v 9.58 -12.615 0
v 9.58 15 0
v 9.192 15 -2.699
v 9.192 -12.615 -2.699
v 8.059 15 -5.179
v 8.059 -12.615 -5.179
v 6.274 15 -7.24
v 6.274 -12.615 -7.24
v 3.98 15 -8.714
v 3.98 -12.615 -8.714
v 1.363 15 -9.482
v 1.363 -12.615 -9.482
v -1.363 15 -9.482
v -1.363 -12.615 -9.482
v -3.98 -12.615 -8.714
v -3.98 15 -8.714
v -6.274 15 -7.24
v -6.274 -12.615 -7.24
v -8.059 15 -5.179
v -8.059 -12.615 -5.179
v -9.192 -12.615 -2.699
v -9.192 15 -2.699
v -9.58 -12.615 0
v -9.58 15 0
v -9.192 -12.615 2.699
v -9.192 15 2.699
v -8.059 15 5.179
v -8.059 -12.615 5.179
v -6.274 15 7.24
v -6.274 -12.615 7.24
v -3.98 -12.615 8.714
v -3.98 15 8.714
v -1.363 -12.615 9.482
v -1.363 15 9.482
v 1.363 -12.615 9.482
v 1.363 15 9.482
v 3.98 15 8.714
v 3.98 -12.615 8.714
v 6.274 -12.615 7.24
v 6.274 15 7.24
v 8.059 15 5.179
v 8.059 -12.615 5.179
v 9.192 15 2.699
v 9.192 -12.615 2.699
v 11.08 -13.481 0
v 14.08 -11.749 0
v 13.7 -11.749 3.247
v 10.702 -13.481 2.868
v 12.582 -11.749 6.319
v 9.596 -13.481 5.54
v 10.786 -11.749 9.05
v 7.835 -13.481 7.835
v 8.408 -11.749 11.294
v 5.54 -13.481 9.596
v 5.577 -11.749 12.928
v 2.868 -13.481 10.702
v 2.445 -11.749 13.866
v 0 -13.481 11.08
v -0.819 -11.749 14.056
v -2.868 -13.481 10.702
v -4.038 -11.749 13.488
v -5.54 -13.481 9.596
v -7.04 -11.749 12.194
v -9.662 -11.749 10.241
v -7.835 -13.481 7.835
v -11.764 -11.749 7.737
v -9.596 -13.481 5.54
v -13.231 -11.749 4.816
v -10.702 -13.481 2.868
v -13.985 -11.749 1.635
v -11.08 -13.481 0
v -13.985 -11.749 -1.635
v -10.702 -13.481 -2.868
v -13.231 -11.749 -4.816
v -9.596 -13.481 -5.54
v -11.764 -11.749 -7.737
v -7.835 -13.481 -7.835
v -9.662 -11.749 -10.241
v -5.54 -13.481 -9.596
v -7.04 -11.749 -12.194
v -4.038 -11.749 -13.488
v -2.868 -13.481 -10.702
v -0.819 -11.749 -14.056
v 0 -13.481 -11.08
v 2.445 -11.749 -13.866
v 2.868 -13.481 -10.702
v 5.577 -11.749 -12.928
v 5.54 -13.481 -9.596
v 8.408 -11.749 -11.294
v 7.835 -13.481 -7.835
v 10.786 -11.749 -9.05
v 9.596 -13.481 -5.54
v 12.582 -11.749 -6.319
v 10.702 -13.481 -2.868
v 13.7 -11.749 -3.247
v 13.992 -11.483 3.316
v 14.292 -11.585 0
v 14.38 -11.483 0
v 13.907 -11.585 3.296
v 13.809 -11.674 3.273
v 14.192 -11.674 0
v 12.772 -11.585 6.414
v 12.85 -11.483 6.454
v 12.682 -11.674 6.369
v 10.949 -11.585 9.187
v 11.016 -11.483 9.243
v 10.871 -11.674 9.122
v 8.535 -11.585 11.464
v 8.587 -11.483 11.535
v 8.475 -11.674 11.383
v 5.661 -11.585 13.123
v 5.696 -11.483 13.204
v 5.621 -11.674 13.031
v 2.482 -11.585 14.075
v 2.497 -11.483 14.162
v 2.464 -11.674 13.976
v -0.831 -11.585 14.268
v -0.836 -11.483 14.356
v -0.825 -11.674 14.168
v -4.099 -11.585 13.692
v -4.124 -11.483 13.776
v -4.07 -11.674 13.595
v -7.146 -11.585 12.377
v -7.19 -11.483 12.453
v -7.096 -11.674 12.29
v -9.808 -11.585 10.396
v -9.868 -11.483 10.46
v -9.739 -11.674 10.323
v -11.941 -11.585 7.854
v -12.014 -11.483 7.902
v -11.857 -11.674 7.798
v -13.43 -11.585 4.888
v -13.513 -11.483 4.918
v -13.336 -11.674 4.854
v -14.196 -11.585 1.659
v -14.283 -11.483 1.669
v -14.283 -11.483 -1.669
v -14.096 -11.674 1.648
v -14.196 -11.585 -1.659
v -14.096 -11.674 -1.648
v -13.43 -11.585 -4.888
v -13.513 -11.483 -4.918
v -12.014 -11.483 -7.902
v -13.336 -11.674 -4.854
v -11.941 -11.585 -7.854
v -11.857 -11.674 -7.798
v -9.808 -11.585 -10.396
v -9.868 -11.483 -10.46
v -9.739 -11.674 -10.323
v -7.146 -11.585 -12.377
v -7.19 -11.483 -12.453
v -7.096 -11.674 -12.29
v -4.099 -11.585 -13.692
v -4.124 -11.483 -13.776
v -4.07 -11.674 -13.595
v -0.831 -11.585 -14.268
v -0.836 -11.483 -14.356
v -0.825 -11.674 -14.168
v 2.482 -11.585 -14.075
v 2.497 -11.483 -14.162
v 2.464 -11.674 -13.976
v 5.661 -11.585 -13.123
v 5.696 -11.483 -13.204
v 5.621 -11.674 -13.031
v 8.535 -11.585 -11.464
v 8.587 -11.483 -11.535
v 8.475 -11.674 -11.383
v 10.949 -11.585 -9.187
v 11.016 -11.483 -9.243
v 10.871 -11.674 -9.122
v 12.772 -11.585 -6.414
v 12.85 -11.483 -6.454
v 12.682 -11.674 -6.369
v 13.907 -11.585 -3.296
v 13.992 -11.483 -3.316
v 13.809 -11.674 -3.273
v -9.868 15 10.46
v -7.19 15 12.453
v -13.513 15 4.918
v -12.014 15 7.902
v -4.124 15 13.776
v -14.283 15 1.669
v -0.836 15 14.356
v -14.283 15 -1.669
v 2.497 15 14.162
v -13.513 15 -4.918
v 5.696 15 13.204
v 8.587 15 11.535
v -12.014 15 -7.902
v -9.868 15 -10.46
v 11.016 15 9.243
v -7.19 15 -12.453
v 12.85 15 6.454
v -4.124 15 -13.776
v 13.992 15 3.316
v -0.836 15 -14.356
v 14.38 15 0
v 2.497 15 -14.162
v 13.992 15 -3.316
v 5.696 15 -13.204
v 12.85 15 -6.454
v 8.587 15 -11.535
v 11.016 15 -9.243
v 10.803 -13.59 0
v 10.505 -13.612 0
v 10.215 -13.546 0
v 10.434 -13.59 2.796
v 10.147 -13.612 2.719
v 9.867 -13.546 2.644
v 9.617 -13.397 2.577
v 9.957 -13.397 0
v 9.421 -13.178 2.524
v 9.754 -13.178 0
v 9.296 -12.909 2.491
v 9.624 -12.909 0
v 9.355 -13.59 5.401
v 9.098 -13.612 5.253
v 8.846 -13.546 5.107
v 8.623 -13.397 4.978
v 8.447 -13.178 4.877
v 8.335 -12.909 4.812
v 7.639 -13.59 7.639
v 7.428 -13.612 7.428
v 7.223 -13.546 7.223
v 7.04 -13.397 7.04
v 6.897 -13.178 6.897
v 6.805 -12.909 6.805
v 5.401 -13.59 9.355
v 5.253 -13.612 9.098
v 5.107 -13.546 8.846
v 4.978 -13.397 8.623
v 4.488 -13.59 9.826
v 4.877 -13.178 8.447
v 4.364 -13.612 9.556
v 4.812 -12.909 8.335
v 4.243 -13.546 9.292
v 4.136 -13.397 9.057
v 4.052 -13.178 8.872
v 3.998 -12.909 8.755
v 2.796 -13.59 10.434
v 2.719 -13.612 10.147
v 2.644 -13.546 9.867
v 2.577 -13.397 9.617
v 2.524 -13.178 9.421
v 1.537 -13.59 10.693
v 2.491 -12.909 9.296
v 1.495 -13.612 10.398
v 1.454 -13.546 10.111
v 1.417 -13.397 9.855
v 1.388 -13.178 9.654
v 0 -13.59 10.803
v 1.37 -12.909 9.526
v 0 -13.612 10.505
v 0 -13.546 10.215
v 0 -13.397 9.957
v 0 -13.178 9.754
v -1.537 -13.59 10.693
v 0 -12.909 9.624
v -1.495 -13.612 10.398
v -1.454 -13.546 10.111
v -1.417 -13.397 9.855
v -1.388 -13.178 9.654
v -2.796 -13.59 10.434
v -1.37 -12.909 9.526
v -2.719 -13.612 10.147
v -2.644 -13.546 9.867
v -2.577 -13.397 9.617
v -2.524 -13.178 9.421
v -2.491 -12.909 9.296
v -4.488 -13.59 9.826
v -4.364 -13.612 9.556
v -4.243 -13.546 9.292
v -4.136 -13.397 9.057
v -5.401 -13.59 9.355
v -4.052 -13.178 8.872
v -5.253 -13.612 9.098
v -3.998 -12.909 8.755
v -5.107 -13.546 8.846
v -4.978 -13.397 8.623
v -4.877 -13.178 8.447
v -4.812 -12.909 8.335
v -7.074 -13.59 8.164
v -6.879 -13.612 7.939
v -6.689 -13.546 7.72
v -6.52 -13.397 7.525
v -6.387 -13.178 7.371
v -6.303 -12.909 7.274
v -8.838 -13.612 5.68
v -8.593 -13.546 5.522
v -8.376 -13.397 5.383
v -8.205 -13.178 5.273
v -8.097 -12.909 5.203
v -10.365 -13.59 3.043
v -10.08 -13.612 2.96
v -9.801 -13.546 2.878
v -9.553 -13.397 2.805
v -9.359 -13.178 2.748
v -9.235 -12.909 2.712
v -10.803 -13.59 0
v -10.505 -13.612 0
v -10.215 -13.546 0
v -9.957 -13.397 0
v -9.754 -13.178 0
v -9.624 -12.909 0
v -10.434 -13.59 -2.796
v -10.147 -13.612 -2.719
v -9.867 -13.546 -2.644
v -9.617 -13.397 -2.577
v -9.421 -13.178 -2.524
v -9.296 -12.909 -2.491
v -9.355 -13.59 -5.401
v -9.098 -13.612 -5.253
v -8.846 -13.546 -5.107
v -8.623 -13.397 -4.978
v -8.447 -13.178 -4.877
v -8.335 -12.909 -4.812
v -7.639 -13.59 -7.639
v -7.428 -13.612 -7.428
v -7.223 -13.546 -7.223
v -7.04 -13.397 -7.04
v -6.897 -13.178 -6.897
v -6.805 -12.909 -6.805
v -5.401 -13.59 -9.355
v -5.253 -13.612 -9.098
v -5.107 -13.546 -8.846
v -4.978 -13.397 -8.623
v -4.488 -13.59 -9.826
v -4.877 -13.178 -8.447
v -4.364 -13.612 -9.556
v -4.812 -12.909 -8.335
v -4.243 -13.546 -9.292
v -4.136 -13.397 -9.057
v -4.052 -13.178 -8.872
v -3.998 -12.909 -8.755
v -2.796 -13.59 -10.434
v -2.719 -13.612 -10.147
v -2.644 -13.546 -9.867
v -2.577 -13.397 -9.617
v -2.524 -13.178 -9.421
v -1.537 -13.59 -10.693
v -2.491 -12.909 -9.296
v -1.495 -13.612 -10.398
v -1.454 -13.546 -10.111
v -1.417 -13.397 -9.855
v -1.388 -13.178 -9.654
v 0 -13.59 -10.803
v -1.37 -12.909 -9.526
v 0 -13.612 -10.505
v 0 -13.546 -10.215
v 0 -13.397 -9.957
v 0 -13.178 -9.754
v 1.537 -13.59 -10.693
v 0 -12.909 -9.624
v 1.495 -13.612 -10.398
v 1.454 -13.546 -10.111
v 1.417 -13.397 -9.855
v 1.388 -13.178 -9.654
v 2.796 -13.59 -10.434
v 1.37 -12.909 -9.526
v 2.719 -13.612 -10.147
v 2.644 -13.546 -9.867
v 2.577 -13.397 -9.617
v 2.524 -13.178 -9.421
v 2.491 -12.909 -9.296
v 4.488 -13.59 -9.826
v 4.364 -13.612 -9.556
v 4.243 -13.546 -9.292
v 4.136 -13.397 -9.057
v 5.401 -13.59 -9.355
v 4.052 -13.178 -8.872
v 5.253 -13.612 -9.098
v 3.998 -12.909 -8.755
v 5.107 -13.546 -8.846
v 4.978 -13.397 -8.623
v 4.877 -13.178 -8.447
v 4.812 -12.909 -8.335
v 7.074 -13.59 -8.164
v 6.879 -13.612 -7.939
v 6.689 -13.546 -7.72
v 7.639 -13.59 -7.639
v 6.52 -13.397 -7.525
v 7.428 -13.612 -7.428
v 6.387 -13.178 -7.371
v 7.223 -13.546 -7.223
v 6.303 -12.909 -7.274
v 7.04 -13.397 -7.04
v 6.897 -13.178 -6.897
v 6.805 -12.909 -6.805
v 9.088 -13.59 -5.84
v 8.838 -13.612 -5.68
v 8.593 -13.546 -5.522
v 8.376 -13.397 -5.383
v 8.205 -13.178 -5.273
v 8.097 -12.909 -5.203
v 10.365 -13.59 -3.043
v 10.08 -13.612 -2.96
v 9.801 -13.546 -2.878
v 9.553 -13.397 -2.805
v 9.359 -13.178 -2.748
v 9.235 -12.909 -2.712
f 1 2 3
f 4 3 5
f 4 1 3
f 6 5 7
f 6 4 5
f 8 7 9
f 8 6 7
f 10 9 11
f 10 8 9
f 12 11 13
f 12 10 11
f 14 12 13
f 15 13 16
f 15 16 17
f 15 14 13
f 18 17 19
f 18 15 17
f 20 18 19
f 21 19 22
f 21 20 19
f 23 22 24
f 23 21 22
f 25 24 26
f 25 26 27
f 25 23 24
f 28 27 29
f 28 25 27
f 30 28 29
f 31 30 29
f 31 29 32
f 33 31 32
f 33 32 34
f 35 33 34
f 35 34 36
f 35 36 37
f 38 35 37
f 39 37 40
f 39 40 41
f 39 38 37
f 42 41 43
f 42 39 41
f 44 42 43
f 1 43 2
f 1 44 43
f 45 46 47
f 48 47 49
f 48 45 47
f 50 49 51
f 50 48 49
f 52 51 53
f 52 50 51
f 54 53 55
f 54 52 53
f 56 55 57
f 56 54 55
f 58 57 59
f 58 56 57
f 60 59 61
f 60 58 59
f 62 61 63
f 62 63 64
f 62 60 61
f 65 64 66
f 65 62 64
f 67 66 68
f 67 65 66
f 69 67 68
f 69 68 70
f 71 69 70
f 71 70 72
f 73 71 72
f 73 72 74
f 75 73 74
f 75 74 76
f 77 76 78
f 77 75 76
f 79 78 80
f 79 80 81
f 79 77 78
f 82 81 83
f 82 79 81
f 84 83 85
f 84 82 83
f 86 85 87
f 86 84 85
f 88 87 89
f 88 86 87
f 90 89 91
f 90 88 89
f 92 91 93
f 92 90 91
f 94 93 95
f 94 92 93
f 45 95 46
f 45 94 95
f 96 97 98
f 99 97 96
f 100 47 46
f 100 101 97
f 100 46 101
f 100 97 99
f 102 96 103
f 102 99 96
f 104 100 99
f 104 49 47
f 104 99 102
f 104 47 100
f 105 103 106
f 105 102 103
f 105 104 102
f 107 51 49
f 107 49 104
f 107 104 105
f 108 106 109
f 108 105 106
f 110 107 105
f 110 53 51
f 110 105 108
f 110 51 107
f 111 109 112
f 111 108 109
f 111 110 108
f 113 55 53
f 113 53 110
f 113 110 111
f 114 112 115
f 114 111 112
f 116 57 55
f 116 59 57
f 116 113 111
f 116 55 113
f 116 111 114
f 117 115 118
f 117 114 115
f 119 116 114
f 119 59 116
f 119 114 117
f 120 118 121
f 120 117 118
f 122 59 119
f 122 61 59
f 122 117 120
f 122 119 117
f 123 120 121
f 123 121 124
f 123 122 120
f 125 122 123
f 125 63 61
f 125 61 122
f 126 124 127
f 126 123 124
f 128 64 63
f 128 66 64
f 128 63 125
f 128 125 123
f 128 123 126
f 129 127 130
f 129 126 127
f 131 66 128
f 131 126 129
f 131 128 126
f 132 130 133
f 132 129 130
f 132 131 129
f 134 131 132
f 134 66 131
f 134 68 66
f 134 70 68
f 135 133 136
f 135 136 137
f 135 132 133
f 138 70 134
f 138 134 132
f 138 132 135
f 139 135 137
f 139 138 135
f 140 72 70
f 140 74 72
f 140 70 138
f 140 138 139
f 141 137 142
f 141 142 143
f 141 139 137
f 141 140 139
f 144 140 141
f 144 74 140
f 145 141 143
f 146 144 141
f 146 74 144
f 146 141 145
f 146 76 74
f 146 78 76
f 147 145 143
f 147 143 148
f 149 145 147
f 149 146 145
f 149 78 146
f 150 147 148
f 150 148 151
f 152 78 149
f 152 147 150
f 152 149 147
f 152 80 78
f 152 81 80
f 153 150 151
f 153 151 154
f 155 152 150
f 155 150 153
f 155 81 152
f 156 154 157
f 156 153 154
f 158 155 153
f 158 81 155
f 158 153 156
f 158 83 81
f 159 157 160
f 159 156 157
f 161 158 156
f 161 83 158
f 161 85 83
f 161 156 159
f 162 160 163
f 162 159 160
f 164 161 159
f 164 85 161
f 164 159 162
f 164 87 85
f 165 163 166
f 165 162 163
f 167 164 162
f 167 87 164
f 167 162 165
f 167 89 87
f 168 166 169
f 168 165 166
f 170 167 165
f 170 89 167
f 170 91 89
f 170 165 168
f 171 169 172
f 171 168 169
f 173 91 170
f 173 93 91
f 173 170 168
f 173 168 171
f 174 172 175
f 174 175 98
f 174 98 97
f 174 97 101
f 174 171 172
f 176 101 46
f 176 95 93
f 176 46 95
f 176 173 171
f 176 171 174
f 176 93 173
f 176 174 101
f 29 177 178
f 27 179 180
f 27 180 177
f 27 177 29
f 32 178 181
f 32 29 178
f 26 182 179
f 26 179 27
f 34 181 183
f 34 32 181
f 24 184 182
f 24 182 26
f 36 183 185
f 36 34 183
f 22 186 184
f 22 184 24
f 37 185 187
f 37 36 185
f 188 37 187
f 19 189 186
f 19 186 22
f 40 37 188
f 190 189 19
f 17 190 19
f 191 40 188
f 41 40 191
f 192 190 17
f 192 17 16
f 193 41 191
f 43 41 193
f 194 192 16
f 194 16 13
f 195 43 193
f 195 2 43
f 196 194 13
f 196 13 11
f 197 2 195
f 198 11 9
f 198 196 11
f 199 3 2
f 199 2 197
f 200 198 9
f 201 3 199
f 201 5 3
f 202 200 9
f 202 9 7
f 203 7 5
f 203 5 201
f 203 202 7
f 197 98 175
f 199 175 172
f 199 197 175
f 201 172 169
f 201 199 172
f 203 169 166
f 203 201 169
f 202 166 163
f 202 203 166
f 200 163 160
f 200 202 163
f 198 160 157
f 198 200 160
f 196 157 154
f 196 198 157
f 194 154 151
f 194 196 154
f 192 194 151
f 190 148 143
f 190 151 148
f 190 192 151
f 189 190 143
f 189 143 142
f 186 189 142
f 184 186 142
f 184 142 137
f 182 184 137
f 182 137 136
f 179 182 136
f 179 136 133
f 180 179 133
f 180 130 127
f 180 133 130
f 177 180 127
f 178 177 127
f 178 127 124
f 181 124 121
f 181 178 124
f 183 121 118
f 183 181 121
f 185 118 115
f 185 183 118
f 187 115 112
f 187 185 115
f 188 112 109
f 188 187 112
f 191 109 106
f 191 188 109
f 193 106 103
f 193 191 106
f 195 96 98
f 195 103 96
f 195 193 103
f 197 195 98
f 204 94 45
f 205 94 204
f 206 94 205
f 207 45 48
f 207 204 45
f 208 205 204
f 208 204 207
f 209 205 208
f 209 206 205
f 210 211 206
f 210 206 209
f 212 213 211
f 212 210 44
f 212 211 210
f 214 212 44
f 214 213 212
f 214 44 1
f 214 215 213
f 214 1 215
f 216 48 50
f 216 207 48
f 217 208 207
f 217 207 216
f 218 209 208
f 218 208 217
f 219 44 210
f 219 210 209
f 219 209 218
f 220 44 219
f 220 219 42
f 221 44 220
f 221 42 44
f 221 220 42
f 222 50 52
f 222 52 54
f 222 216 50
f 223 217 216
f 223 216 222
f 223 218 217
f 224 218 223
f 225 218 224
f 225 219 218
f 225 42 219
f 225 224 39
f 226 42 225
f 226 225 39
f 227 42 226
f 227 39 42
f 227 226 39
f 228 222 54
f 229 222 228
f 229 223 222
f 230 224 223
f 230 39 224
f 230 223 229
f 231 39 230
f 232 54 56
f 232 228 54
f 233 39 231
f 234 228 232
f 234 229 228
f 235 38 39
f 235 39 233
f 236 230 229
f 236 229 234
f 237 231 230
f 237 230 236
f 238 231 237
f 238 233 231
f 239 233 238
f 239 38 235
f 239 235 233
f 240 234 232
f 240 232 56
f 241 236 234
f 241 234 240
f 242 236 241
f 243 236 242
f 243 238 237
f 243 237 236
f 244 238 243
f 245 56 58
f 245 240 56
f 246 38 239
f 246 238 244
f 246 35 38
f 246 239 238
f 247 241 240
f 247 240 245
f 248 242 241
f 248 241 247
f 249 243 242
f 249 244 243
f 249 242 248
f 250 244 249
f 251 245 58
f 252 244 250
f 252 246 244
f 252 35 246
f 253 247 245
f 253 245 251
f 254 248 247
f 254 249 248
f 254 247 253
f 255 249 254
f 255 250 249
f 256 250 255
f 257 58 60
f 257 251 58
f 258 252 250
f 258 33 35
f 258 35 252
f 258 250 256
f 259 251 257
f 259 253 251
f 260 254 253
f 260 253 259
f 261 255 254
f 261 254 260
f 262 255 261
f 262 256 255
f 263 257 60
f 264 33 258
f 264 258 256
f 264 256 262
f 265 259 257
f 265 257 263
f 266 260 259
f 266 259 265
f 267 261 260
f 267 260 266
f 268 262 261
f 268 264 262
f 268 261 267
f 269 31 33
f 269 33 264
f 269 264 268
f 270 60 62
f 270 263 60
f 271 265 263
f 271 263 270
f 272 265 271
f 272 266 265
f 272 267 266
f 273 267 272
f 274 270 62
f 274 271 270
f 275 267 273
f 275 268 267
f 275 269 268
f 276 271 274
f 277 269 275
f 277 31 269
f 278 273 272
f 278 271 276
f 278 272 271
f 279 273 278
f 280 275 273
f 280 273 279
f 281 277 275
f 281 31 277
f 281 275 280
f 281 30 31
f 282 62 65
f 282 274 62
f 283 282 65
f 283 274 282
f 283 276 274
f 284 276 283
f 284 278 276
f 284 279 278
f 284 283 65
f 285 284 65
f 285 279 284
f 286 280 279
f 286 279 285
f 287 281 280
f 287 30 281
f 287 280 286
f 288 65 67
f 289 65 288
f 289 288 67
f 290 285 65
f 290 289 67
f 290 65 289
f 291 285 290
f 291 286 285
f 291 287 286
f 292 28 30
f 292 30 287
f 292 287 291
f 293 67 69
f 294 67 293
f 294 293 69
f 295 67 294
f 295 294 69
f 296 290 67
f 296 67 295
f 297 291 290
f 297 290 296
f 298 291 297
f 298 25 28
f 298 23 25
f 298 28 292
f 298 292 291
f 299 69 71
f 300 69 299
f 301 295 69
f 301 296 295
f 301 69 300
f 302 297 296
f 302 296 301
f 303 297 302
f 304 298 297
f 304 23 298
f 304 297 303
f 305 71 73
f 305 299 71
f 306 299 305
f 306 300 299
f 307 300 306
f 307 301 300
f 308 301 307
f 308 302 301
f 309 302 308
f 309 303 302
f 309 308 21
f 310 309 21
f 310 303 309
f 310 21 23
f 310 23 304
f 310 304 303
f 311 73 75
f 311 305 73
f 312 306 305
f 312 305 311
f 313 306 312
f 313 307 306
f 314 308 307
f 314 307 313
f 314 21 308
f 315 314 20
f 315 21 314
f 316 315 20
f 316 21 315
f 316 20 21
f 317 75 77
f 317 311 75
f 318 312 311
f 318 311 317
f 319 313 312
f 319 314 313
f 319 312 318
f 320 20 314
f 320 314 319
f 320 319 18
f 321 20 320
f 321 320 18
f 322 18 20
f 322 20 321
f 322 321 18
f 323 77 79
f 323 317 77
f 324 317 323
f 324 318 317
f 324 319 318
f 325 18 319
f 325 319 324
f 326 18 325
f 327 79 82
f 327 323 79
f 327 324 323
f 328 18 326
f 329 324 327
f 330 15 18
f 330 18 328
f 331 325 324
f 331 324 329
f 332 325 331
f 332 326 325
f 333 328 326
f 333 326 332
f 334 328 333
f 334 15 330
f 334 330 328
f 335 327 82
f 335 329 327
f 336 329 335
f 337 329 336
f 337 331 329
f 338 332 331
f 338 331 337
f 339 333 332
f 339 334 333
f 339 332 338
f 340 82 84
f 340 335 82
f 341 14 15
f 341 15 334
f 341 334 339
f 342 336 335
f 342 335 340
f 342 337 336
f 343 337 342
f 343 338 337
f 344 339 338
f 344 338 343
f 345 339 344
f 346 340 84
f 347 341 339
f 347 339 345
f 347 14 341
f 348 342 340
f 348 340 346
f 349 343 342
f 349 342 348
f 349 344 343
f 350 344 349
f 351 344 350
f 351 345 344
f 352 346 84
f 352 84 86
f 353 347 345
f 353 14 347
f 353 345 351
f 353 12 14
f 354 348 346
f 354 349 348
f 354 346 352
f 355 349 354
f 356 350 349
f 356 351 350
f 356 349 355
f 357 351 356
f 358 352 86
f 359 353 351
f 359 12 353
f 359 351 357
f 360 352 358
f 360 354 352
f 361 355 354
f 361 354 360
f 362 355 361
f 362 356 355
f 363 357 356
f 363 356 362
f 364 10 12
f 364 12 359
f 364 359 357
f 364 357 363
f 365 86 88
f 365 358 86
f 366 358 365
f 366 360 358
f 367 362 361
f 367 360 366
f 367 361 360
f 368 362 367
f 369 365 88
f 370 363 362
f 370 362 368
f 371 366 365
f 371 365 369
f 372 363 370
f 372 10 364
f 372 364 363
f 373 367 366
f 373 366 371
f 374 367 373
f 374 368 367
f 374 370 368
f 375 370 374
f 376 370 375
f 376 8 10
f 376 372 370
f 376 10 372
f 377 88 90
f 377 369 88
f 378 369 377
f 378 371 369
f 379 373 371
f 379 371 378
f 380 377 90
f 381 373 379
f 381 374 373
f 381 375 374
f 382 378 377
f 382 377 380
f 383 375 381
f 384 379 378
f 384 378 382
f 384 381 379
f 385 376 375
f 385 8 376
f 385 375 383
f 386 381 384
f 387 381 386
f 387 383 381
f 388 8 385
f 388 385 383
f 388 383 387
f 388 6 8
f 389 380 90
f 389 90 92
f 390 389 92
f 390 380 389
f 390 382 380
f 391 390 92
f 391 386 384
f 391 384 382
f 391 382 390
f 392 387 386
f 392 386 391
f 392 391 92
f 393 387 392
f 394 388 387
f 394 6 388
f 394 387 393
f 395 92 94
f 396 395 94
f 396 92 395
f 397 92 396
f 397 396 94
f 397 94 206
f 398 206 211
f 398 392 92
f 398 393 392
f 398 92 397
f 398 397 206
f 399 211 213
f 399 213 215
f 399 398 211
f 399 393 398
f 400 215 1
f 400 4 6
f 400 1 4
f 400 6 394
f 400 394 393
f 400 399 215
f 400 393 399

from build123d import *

# Parameters (mm, degrees)
SKETCH4_R           = 14.58
SKETCH4_R_2         = 9.58
BOSS_EXTRUDE1_DEPTH = 15
SKETCH5_R           = 14.58
SKETCH5_R_2         = 14.38
CUT_EXTRUDE1_DEPTH  = 31


with BuildPart() as part:
    # Sketch2 → Revolve1 (revolve)
    with BuildSketch(Plane.XY):
        with BuildLine():
            Line((9.58, 0), (14.58, 0))
            Line((14.58, 0), (14.58, -10.882649731))
            ThreePointArc((14.58, -10.882649731), (14.446025404, -11.382649731), (14.08, -11.748675135))
            Line((14.08, -11.748675135), (11.08, -13.480725942))
            ThreePointArc((11.08, -13.480725942), (10.08, -13.480725942), (9.58, -12.614700538))
            Line((9.58, -12.614700538), (9.58, 0))
        make_face()
    revolve(axis=Axis((0, 0, 0), (0, -1, 0)))

    # Sketch4 → Boss-Extrude1 (add)
    with BuildSketch(Plane(origin=(0, 0, 0), x_dir=(1, 0, 0), z_dir=(0, 1, 0))):
        Circle(SKETCH4_R)
        Circle(SKETCH4_R_2, mode=Mode.SUBTRACT)
    extrude(amount=BOSS_EXTRUDE1_DEPTH)

    # Sketch5 → Cut-Extrude1 (cut)
    with BuildSketch(Plane(origin=(0, 15, 0), x_dir=(1, 0, 0), z_dir=(0, 1, 0))):
        Circle(SKETCH5_R)
        Circle(SKETCH5_R_2, mode=Mode.SUBTRACT)
    extrude(amount=-CUT_EXTRUDE1_DEPTH, mode=Mode.SUBTRACT)


solid = part.part
